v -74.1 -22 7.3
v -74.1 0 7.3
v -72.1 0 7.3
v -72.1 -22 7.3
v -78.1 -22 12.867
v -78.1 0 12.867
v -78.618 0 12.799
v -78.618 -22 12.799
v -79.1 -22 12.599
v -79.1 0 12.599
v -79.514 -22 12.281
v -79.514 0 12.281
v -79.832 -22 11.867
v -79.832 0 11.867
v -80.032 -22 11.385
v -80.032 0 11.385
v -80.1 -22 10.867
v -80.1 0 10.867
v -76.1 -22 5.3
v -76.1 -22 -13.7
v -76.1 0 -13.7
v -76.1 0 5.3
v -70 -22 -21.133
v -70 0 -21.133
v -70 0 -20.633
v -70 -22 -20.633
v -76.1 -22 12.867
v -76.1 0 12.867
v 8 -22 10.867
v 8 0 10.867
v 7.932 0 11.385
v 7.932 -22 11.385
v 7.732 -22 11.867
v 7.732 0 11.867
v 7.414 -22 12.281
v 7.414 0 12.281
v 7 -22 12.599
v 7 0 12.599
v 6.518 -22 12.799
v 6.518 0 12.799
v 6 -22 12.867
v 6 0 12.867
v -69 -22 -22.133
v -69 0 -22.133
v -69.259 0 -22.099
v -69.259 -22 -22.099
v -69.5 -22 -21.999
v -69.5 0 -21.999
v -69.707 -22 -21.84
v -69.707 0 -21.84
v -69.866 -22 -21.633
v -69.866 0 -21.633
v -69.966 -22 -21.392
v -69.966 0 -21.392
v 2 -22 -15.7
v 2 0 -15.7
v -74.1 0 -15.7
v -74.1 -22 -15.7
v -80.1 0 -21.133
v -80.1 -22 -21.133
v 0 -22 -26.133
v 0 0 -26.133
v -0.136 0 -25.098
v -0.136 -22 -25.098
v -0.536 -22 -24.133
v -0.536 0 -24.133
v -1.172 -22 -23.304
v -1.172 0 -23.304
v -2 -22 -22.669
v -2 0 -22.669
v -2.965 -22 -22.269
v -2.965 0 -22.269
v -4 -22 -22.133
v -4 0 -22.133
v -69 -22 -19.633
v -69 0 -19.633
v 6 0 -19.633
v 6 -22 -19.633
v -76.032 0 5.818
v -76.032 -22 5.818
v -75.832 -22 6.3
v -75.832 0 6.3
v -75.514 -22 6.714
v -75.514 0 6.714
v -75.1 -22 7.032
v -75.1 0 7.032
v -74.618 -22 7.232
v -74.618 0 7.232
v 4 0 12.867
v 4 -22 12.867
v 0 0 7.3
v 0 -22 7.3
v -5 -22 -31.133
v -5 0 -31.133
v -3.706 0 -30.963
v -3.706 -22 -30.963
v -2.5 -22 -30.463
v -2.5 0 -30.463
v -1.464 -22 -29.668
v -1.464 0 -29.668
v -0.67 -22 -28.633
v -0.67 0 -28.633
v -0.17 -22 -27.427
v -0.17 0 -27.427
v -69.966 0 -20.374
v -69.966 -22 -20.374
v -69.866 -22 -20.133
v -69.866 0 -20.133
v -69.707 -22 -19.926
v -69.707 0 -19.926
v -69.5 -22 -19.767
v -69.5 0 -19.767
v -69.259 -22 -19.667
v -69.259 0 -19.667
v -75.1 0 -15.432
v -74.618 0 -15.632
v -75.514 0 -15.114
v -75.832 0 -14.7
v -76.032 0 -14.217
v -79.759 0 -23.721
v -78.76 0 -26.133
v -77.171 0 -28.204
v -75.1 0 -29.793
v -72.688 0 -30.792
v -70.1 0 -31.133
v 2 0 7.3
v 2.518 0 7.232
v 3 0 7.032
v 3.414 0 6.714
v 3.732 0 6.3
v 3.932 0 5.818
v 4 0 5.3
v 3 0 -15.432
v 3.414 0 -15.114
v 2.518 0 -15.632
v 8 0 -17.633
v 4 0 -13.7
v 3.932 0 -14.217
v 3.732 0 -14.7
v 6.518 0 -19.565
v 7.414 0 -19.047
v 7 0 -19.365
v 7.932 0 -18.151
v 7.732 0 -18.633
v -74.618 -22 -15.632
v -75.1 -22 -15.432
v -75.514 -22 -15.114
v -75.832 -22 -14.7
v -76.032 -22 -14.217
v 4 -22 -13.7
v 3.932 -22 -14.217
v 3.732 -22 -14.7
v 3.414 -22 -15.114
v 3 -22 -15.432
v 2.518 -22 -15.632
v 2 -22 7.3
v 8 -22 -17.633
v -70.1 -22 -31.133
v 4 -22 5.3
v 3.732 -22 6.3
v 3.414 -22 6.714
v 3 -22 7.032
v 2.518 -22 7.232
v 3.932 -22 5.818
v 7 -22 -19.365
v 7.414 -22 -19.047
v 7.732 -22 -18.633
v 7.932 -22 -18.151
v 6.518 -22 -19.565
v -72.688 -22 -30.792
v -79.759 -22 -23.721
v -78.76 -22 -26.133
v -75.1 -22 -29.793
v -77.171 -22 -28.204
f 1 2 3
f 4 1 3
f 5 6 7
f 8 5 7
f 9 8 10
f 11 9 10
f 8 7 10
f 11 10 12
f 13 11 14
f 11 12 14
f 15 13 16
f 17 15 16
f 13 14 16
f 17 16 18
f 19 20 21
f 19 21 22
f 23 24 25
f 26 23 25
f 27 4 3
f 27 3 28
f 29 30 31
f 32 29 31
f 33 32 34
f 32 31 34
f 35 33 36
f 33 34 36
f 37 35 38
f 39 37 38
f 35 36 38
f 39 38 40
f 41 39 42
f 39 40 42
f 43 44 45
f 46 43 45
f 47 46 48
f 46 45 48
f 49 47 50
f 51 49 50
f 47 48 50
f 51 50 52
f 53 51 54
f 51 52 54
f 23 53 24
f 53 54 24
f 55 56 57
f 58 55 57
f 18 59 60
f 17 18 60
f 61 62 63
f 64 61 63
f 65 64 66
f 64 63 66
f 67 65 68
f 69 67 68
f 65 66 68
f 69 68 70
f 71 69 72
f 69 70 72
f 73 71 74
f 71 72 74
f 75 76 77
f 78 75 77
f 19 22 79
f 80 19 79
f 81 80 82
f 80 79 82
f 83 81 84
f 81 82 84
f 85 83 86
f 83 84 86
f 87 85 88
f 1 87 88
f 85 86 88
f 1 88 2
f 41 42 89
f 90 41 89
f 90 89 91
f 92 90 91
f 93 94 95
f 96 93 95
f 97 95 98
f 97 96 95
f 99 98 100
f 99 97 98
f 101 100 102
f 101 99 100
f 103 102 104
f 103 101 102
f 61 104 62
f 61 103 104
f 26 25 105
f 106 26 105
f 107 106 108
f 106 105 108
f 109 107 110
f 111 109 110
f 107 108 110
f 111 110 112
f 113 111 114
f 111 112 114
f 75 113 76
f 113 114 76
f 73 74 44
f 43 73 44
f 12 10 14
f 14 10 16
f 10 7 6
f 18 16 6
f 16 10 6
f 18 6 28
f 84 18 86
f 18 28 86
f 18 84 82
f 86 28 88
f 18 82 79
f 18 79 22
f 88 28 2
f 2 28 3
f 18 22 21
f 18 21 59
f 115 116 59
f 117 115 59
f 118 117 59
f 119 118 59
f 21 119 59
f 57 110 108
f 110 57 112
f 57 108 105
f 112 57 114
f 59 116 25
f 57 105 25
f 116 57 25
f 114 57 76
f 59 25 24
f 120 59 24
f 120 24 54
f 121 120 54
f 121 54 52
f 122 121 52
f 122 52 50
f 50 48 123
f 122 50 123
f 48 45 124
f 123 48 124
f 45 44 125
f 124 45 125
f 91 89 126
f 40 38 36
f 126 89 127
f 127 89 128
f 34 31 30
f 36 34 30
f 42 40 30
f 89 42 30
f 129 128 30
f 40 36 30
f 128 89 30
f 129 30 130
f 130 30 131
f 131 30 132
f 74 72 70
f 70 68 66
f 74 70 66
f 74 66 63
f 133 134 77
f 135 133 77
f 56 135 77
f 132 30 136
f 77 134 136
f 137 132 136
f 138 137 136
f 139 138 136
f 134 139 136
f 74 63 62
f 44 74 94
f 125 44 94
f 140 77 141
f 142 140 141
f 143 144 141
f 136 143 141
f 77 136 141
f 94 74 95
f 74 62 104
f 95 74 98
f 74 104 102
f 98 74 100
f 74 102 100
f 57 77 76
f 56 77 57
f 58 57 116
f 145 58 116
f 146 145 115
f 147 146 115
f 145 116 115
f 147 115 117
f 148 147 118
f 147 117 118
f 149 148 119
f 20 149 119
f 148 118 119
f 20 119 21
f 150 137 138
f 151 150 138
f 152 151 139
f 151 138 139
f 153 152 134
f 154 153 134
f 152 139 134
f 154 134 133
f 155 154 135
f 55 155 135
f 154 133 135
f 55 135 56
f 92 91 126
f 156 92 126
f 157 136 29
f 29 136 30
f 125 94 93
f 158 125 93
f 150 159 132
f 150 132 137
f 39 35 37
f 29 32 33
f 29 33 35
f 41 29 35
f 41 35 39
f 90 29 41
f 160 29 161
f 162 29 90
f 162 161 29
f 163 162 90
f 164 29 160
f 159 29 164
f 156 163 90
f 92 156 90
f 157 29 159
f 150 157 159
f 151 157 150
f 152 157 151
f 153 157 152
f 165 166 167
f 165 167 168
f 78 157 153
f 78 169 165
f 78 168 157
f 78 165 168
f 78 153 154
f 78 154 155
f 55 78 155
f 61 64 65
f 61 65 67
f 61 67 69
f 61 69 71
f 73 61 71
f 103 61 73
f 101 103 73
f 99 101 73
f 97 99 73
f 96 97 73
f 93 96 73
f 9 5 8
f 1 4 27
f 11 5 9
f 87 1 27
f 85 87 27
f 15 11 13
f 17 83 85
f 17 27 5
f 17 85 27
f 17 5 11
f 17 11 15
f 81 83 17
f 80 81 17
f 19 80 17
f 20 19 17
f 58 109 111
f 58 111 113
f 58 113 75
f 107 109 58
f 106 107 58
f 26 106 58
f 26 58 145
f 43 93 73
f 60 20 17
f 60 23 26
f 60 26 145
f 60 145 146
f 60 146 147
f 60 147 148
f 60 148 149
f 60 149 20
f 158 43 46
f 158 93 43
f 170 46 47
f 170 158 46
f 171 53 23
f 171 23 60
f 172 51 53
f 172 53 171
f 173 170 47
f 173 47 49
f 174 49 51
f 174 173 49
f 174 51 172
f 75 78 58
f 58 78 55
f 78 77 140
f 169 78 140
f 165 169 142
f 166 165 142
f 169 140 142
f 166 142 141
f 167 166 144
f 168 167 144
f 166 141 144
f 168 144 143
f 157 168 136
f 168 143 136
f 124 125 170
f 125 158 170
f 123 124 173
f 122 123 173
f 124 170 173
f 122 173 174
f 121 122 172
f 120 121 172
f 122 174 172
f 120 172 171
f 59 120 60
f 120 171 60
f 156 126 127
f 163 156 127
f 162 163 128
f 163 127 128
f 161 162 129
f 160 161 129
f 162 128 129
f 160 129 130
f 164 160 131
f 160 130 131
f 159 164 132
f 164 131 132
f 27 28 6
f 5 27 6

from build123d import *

# Parameters (mm, degrees)
F1_DEPTH = 22
F2_DEPTH = 5
F3_DEPTH = 5
F4_DEPTH = 5
F5_R     = 10
F6_R     = 4.99999


# Not quite as in the source:
# - a fillet or chamfer is up to 0.001 mm smaller than in the source, because OpenCascade refuses the exact size


with BuildPart() as f1:
    # F0 (on Front) → F1 (new body)
    with BuildSketch(Plane.XZ):
        with BuildLine():
            Line((-80.1, 10.8671029838), (-80.1, -15.1328970162))
            Line((-80.1, -15.1328970162), (-80.1, -21.1328970162))
            ThreePointArc((-80.1, -21.1328970162), (-78.6355339059, -24.6684309221), (-75.1, -26.1328970162))
            Line((-75.1, -26.1328970162), (0, -26.1328970162))
            ThreePointArc((0, -26.1328970162), (-1.1715728753, -23.3044698915), (-4, -22.1328970162))
            Line((-4, -22.1328970162), (-69, -22.1328970162))
            ThreePointArc((-69, -22.1328970162), (-69.7071067812, -21.8400037974), (-70, -21.1328970162))
            Line((-70, -21.1328970162), (-70, -20.6328970162))
            ThreePointArc((-70, -20.6328970162), (-69.7071067812, -19.925790235), (-69, -19.6328970162))
            Line((-69, -19.6328970162), (6, -19.6328970162))
            ThreePointArc((6, -19.6328970162), (7.4142135624, -19.0471105786), (8, -17.6328970162))
            Line((8, -17.6328970162), (8, 10.8671029838))
            ThreePointArc((8, 10.8671029838), (7.4142135624, 12.2813165462), (6, 12.8671029838))
            Line((6, 12.8671029838), (4, 12.8671029838))
            Line((4, 12.8671029838), (0, 7.3002231531))
            Line((0, 7.3002231531), (2, 7.3002231531))
            ThreePointArc((2, 7.3002231531), (3.4142135624, 6.7144367155), (4, 5.3002231531))
            Line((4, 5.3002231531), (4, -13.6997768469))
            ThreePointArc((4, -13.6997768469), (3.4142135624, -15.1139904093), (2, -15.6997768469))
            Line((2, -15.6997768469), (-74.1, -15.6997768469))
            ThreePointArc((-74.1, -15.6997768469), (-75.5142135624, -15.1139904093), (-76.1, -13.6997768469))
            Line((-76.1, -13.6997768469), (-76.1, 5.3002231531))
            ThreePointArc((-76.1, 5.3002231531), (-75.5142135624, 6.7144367155), (-74.1, 7.3002231531))
            Line((-74.1, 7.3002231531), (-72.1, 7.3002231531))
            Line((-72.1, 7.3002231531), (-76.1, 12.8671029838))
            Line((-76.1, 12.8671029838), (-78.1, 12.8671029838))
            ThreePointArc((-78.1, 12.8671029838), (-79.5142135624, 12.2813165462), (-80.1, 10.8671029838))
        make_face()
    extrude(amount=F1_DEPTH)

    # F2 (add): a face of the model
    f2_faces = [f1.faces().sort_by_distance(p)[0] for p in [
        (-37.55, -11, -26.1328970162),
    ]]
    extrude(f2_faces, amount=F2_DEPTH)

    # F3 (add, through all): a face of the model
    f3_faces = [f1.faces().sort_by_distance(p)[0] for p in [
        (-75.1, -11, -28.6328970162),
    ]]
    extrude(f3_faces, amount=F3_DEPTH)

    # F4 (add): a face of the model
    f4_faces = [f1.faces().sort_by_distance(p)[0] for p in [
        (-77.6, -11, -26.1328970162),
    ]]
    extrude(f4_faces, amount=F4_DEPTH)

    # F5
    f5_edges = [f1.edges().sort_by_distance(p)[0] for p in [
        (-80.1, -11, -31.132897),
    ]]
    fillet(f5_edges, radius=F5_R)

    # F6 (radius 5 in the source; OpenCascade refuses exactly that, so slightly less here)
    f6_edges = [f1.edges().sort_by_distance(p)[0] for p in [
        (0, -11, -31.132897),
    ]]
    fillet(f6_edges, radius=F6_R)


solid = f1.part
